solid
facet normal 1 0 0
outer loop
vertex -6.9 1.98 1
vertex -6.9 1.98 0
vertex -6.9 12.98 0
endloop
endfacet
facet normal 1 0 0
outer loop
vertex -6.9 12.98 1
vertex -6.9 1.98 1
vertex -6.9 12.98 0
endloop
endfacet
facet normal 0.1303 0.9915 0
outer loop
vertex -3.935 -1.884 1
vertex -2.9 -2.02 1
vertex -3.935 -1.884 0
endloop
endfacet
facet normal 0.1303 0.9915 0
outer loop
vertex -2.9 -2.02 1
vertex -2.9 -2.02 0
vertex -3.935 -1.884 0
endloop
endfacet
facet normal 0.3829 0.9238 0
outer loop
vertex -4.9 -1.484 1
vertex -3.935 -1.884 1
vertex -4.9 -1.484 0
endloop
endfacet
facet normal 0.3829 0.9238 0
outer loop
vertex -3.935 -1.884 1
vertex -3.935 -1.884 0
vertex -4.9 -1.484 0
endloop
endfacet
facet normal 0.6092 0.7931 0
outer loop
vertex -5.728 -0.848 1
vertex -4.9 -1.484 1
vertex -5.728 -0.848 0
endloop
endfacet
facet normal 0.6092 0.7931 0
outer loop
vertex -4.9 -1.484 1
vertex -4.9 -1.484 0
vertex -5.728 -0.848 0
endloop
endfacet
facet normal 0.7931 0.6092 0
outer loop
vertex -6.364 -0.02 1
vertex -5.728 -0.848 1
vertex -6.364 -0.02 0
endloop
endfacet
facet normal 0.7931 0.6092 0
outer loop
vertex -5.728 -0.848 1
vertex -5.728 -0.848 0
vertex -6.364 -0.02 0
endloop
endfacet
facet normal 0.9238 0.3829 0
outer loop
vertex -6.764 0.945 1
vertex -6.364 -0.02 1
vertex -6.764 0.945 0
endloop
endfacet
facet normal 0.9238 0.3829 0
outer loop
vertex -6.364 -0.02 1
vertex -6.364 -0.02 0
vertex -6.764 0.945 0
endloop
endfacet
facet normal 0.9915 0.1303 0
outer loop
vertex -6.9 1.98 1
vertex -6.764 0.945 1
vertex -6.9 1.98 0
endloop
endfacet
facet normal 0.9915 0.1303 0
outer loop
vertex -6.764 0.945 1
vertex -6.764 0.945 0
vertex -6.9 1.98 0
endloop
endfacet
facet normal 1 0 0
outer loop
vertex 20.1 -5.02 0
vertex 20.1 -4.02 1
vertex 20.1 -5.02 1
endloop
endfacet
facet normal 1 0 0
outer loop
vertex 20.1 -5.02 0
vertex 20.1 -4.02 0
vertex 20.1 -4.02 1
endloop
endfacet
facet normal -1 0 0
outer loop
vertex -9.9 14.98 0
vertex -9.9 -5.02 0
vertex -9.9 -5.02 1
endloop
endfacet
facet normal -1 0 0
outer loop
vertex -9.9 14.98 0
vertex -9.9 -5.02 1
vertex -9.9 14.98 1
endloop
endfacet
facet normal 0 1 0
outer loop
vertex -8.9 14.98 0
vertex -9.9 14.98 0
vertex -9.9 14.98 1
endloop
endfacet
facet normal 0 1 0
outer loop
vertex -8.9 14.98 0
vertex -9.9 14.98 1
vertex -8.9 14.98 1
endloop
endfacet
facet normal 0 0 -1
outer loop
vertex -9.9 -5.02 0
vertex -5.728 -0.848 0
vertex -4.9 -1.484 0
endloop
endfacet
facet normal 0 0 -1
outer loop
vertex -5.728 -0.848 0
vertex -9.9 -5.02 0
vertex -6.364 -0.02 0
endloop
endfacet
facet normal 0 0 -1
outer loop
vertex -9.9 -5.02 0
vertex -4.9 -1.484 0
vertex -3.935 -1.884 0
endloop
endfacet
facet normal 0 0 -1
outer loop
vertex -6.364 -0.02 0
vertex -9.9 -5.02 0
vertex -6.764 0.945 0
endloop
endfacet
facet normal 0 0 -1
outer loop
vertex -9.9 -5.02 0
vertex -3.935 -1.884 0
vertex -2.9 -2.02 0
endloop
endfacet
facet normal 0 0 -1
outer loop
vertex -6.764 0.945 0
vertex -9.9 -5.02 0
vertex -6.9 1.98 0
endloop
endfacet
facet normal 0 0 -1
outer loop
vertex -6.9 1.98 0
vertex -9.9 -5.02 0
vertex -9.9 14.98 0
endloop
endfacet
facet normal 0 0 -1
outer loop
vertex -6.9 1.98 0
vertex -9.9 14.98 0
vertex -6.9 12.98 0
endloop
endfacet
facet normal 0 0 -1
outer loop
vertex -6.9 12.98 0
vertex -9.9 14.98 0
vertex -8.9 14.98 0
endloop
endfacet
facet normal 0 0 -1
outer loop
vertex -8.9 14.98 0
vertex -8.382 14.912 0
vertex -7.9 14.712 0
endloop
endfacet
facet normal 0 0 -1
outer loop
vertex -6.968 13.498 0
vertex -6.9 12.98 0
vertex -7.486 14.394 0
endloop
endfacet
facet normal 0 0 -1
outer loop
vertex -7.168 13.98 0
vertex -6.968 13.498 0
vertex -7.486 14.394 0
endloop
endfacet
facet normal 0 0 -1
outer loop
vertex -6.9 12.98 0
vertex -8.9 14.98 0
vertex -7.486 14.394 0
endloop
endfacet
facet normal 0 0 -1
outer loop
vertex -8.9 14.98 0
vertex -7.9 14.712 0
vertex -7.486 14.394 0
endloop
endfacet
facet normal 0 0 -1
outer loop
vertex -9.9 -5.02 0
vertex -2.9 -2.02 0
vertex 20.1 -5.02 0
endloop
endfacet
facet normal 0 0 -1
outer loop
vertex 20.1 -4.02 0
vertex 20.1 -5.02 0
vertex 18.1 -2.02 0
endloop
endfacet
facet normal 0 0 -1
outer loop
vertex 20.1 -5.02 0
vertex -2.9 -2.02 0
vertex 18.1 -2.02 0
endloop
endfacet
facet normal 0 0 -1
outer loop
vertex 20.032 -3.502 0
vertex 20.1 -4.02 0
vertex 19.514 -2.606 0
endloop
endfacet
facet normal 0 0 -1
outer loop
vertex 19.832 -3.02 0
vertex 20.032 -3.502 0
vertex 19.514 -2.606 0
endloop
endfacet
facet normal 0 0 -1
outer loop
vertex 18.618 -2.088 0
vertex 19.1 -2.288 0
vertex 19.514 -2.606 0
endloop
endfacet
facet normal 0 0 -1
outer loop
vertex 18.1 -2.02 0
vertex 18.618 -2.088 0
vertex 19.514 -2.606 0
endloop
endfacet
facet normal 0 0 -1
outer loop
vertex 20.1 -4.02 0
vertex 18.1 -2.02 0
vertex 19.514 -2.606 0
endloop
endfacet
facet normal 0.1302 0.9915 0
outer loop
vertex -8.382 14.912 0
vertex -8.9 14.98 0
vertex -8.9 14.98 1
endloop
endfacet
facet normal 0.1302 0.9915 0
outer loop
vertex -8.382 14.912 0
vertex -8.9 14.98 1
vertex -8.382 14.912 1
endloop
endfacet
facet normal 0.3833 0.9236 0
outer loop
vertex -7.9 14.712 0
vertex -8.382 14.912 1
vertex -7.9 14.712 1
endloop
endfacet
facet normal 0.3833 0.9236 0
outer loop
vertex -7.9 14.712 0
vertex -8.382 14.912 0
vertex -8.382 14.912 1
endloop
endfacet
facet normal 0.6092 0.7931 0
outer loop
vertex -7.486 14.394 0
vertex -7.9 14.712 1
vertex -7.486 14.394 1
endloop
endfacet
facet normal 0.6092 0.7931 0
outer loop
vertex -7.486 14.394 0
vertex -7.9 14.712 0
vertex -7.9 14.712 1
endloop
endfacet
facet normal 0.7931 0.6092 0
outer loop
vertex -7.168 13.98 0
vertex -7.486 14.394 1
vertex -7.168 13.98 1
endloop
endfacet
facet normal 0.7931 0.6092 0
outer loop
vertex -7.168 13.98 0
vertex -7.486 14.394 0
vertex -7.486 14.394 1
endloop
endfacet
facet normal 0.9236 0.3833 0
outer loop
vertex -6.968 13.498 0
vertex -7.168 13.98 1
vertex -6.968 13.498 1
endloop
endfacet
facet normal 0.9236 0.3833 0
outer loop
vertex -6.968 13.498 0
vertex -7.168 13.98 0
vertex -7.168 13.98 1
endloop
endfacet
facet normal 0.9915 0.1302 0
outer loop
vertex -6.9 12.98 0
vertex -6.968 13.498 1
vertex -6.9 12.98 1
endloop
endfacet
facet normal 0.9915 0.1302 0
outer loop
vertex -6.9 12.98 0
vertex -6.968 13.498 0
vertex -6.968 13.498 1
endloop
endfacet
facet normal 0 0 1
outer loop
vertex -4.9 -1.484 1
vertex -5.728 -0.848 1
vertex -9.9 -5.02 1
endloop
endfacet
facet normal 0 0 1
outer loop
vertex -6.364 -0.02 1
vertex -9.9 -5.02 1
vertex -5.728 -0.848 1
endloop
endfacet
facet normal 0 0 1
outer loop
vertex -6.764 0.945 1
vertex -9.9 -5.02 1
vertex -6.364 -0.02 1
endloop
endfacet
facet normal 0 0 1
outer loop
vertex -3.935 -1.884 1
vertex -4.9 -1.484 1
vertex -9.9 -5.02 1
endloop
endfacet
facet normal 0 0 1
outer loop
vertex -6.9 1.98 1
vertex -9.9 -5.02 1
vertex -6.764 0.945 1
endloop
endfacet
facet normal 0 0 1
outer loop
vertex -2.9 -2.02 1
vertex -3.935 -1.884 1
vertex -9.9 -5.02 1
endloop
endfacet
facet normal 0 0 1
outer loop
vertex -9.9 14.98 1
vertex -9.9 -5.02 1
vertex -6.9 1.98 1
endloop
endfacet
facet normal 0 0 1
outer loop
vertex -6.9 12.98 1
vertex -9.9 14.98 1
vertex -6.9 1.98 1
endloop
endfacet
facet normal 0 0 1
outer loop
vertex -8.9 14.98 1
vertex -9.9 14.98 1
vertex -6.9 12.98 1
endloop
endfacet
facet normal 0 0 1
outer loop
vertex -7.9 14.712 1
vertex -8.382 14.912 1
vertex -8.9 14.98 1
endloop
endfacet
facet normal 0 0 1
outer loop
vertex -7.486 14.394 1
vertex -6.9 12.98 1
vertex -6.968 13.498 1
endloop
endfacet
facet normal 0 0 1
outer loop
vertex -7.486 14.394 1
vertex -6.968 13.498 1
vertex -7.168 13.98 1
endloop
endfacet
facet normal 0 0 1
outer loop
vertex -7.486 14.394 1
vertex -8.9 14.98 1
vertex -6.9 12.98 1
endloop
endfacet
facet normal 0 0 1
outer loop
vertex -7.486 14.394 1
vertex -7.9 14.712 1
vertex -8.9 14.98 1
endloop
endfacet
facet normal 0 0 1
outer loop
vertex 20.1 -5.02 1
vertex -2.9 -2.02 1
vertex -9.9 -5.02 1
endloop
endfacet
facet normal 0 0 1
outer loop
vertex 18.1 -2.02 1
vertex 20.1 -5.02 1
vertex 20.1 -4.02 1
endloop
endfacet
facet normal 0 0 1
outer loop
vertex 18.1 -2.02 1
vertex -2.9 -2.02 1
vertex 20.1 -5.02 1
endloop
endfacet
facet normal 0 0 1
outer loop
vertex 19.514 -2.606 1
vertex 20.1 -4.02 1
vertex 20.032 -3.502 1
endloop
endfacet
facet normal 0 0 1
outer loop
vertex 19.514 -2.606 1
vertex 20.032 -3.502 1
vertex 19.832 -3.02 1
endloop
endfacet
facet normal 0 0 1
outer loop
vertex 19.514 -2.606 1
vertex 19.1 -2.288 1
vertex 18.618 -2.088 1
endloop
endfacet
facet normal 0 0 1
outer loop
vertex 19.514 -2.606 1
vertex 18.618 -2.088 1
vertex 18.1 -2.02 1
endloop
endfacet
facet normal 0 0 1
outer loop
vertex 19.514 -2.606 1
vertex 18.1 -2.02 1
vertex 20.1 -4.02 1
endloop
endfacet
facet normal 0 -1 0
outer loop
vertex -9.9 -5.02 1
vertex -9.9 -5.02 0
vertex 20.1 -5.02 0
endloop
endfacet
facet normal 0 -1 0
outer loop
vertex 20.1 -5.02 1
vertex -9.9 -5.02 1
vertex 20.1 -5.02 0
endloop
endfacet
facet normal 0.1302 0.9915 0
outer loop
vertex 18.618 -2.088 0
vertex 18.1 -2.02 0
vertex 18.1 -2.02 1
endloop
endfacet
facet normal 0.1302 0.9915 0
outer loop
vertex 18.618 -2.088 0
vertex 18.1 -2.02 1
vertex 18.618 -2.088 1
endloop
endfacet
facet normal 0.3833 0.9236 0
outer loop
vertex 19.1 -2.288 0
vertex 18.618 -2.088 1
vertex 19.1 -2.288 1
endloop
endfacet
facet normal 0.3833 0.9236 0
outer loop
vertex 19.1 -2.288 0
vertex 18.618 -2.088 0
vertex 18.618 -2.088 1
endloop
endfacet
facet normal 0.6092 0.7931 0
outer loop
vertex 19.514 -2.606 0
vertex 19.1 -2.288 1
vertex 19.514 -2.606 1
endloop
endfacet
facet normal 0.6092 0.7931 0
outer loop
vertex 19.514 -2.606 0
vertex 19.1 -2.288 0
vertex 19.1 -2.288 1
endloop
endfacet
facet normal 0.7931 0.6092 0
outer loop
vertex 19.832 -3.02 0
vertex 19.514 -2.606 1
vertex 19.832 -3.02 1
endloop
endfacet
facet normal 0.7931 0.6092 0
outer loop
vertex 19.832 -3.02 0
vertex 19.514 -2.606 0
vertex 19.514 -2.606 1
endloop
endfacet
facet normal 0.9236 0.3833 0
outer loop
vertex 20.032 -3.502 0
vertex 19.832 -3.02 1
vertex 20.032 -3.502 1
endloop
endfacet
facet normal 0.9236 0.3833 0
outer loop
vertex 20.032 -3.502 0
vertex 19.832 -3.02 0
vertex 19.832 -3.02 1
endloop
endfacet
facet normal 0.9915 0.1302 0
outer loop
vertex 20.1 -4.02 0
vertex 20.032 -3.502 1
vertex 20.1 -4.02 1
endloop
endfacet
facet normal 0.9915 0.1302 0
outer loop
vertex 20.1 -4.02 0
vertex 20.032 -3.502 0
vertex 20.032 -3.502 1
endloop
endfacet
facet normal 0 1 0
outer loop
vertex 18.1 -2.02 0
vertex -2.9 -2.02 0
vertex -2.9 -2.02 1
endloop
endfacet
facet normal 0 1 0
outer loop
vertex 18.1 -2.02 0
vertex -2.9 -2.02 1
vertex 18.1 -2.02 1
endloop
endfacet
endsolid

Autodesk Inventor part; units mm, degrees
ref_plane "YZ Plane" through (0, 0, 0) normal (1, 0, 0) x (0, 1, 0)
ref_plane "Начальная плоскость" through (0, 0, 0) normal (0, 0, 1) x (1, 0, 0)
ref_plane "Конечная плоскость" through (0, 0, 1) normal (0, 0, 1) x (1, 0, 0)
sketch "Эскиз" plane through (0, 0, 0) normal (0, 0, 1) x (1, 0, 0)
  line L0 (-6.9, 1.98) -> (-6.9, 12.98)
  line L1 (-9.9, 14.98) -> (-8.9, 14.98)
  line L2 (-9.9, -5.02) -> (-9.9, 14.98)
  line L3 (-9.9, -5.02) -> (20.1, -5.02)
  line L4 (20.1, -4.02) -> (20.1, -5.02)
  line L5 (-2.9, -2.02) -> (18.1, -2.02)
  arc A0 (-6.9, 1.98) -> (-2.9, -2.02) centre (-2.9, 1.98) ccw
  arc A1 (-6.9, 12.98) -> (-8.9, 14.98) centre (-8.9, 12.98) ccw
  arc A2 (20.1, -4.02) -> (18.1, -2.02) centre (18.1, -4.02) ccw
  line L6 (20.1, 0) -> (-9.9, 0) construction
  line L7 (0, -5.02) -> (0, 14.98) construction
  line L8 (0, 0) -> (30, 0) construction
  point P0 (-6.9, -2.02)
  point P1 (-6.9, 14.98)
  point P2 (20.1, -2.02)
  dimension "d17" = 4
  dimension "d19" = 2
  dimension "d26" = 5.02
  dimension "d27" = 9.9
  dimension "d28" = 20
  dimension "d29" = 30
  dimension "d30" = 3
  dimension "d31" = 3
  dimension "d32" = 90
extrude "Базовый элемент" add sketch "Эскиз" along normal up to surface (1 mm away) from surface at 0
sketch "Sketch3" plane through (0, 0, 0) normal (0, 0, 1) x (1, 0, 0)
  line L0 (0, 0) -> (10, 0)
ref_plane "Work Plane10" through (0, 0, 0) normal (0, -1, 0) x (1, 0, 0)
sketch "Sketch4" plane through (0, 0, 0) normal (0, -1, 0) x (1, 0, 0)
  line L0 (-2, 0) -> (12, 0)
  line L1 (-2, 1) -> (12, 1)
  dimension "d25" = 1
equation "\"d17\" = R"
equation "\"d19\" = R1"
equation "\"d26\" = ey"
equation "\"d27\" = ex"
equation "\"d28\" = b"
equation "\"d29\" = ParH"
equation "\"d30\" = ParT"
equation "\"d31\" = ParT"
equation "\"d11\" = G_L"
equation "\"b\" = 20"
equation "\"ParT\" = 3"
equation "\"R\" = 4"
equation "\"G_L\" = d25"
equation "\"R1\" = 2"
equation "\"G_OFFSET_START\" = 0"
equation "\"G_OFFSET_END\" = 0"
equation "\"d21\" = G_OFFSET_END + B_L"
equation "\"ex\" = 9.9"
equation "\"ey\" = 5.02"
equation "\"B_L\" = 1"
equation "\"ParH\" = 30"
properties part number "Кутик ДСТУ 2251" material "С245 ДСТУ 8539"
